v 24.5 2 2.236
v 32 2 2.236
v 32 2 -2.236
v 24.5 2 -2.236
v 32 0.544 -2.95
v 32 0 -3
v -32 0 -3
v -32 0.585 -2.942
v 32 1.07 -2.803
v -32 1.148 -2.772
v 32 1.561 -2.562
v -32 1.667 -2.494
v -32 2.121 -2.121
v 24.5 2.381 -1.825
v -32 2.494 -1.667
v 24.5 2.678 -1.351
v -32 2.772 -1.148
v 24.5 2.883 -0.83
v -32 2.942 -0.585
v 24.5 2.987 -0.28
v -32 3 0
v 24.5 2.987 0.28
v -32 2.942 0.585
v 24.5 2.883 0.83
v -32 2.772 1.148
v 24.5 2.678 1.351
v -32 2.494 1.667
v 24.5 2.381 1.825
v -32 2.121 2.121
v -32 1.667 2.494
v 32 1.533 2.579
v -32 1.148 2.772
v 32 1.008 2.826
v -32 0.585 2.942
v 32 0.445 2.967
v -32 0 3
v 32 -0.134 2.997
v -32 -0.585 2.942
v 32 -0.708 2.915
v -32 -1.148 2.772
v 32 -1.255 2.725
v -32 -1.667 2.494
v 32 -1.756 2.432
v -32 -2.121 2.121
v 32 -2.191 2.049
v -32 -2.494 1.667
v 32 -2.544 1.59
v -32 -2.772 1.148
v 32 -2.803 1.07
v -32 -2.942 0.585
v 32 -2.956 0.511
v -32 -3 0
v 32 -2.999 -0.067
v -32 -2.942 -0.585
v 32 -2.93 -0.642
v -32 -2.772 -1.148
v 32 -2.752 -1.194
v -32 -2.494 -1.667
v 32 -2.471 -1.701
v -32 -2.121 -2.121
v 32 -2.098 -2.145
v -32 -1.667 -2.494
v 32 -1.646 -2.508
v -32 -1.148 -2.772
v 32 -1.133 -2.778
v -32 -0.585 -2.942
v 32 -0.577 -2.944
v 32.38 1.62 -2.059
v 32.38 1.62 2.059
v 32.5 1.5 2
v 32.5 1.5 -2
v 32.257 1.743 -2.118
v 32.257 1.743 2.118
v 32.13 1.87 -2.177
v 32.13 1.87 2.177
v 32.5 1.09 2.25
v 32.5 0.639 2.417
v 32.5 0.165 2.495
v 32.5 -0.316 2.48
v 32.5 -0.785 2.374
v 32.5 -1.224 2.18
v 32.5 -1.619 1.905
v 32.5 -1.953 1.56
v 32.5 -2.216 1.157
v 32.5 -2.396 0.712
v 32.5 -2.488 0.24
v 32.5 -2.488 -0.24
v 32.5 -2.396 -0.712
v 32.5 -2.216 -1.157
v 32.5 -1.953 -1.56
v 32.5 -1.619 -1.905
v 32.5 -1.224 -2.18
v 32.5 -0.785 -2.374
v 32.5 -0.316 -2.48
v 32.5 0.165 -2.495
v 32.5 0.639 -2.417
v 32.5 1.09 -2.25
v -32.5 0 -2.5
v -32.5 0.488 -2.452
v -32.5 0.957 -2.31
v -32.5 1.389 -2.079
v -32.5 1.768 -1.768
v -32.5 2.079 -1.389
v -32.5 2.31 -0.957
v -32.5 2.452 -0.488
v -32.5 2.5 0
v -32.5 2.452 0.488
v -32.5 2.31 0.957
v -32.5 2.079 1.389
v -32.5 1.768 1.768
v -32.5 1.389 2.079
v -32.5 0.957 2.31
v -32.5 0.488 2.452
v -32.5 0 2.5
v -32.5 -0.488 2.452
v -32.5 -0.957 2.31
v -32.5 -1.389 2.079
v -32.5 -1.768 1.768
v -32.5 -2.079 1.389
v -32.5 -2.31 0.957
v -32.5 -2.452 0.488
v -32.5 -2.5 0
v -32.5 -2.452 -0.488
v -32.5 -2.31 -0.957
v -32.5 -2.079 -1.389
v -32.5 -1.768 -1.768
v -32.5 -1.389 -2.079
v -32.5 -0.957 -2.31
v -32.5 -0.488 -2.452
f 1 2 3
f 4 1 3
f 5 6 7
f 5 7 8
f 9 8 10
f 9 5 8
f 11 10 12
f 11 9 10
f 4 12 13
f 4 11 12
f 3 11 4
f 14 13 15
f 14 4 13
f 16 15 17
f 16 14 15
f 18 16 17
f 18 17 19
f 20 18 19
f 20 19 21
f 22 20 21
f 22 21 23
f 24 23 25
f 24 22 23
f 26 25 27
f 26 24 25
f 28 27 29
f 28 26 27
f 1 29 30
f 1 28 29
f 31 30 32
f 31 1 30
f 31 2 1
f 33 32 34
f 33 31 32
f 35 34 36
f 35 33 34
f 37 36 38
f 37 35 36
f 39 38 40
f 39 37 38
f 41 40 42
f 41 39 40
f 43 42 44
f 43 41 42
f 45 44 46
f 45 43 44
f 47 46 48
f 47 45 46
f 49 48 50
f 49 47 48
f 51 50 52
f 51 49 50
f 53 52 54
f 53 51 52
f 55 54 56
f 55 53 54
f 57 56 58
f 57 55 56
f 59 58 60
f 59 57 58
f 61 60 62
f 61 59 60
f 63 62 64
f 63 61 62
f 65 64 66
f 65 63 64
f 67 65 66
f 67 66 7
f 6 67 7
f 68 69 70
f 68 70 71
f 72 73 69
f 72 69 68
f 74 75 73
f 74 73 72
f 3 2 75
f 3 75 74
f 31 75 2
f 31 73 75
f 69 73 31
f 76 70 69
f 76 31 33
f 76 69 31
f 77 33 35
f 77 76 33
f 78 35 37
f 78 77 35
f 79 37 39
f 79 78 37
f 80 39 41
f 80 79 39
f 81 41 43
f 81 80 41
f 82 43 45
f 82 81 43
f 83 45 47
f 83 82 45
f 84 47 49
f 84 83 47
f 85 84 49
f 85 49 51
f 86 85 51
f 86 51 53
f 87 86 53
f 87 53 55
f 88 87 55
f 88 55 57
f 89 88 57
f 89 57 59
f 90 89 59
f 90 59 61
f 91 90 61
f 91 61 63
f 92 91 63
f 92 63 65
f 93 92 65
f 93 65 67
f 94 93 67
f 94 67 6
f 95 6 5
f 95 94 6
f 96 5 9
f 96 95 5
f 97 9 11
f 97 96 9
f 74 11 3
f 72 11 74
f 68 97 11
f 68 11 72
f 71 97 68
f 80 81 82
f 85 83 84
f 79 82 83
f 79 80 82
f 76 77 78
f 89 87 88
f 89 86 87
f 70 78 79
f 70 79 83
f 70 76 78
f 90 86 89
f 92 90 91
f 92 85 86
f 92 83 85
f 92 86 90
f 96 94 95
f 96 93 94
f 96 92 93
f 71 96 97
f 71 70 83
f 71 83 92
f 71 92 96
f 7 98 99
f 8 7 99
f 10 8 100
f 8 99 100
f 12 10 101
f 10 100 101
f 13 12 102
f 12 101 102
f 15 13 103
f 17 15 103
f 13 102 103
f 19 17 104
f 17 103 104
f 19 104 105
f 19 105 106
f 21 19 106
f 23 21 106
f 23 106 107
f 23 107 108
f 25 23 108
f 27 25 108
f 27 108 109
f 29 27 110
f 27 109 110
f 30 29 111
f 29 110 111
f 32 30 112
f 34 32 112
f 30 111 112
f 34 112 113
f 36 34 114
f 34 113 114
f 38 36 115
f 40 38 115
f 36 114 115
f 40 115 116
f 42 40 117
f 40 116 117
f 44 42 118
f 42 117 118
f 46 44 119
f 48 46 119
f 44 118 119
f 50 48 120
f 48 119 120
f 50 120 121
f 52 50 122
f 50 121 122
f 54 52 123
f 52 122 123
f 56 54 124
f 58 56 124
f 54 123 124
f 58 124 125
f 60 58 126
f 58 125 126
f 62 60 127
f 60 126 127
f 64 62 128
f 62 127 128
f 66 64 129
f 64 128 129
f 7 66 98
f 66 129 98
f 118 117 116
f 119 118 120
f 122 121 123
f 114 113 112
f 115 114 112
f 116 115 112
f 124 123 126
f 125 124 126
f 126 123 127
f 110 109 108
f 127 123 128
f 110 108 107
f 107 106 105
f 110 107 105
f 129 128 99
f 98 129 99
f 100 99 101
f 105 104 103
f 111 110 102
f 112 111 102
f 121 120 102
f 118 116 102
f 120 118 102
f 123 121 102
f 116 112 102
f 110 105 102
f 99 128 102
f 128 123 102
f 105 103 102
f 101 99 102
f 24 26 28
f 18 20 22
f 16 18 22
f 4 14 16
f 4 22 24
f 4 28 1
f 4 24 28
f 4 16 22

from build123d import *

# Parameters (mm, degrees)
SKETCH1_R           = 3
BOSS_EXTRUDE1_DEPTH = 32.5
CUT_EXTRUDE1_DEPTH  = 8
CHAMFER1_SIZE       = 0.5


with BuildPart() as part:
    # Sketch1 → Boss-Extrude1 (new body, symmetric)
    with BuildSketch(Plane(origin=(0, 0, 0), x_dir=(0, 0, -1), z_dir=(1, 0, 0))):
        Circle(SKETCH1_R)
    extrude(amount=BOSS_EXTRUDE1_DEPTH, both=True)

    # Sketch2 → Cut-Extrude1 (cut)
    with BuildSketch(Plane(origin=(32.5, 0, 0), x_dir=(0, 0, -1), z_dir=(1, 0, 0))):
        with BuildLine():
            Line((-2.236067977, 2), (2.236067977, 2))
            ThreePointArc((2.236067977, 2), (0, 3), (-2.236067977, 2))
        make_face()
    extrude(amount=-CUT_EXTRUDE1_DEPTH, mode=Mode.SUBTRACT)

    # Chamfer1
    chamfer1_edges = [part.edges().sort_by_distance(p)[0] for p in [
        (-32.5, 0, 3),
        (32.5, -2.802517077, 1.070466269),
        (32.5, 2, 0),
    ]]
    chamfer(chamfer1_edges, length=CHAMFER1_SIZE)


solid = part.part
